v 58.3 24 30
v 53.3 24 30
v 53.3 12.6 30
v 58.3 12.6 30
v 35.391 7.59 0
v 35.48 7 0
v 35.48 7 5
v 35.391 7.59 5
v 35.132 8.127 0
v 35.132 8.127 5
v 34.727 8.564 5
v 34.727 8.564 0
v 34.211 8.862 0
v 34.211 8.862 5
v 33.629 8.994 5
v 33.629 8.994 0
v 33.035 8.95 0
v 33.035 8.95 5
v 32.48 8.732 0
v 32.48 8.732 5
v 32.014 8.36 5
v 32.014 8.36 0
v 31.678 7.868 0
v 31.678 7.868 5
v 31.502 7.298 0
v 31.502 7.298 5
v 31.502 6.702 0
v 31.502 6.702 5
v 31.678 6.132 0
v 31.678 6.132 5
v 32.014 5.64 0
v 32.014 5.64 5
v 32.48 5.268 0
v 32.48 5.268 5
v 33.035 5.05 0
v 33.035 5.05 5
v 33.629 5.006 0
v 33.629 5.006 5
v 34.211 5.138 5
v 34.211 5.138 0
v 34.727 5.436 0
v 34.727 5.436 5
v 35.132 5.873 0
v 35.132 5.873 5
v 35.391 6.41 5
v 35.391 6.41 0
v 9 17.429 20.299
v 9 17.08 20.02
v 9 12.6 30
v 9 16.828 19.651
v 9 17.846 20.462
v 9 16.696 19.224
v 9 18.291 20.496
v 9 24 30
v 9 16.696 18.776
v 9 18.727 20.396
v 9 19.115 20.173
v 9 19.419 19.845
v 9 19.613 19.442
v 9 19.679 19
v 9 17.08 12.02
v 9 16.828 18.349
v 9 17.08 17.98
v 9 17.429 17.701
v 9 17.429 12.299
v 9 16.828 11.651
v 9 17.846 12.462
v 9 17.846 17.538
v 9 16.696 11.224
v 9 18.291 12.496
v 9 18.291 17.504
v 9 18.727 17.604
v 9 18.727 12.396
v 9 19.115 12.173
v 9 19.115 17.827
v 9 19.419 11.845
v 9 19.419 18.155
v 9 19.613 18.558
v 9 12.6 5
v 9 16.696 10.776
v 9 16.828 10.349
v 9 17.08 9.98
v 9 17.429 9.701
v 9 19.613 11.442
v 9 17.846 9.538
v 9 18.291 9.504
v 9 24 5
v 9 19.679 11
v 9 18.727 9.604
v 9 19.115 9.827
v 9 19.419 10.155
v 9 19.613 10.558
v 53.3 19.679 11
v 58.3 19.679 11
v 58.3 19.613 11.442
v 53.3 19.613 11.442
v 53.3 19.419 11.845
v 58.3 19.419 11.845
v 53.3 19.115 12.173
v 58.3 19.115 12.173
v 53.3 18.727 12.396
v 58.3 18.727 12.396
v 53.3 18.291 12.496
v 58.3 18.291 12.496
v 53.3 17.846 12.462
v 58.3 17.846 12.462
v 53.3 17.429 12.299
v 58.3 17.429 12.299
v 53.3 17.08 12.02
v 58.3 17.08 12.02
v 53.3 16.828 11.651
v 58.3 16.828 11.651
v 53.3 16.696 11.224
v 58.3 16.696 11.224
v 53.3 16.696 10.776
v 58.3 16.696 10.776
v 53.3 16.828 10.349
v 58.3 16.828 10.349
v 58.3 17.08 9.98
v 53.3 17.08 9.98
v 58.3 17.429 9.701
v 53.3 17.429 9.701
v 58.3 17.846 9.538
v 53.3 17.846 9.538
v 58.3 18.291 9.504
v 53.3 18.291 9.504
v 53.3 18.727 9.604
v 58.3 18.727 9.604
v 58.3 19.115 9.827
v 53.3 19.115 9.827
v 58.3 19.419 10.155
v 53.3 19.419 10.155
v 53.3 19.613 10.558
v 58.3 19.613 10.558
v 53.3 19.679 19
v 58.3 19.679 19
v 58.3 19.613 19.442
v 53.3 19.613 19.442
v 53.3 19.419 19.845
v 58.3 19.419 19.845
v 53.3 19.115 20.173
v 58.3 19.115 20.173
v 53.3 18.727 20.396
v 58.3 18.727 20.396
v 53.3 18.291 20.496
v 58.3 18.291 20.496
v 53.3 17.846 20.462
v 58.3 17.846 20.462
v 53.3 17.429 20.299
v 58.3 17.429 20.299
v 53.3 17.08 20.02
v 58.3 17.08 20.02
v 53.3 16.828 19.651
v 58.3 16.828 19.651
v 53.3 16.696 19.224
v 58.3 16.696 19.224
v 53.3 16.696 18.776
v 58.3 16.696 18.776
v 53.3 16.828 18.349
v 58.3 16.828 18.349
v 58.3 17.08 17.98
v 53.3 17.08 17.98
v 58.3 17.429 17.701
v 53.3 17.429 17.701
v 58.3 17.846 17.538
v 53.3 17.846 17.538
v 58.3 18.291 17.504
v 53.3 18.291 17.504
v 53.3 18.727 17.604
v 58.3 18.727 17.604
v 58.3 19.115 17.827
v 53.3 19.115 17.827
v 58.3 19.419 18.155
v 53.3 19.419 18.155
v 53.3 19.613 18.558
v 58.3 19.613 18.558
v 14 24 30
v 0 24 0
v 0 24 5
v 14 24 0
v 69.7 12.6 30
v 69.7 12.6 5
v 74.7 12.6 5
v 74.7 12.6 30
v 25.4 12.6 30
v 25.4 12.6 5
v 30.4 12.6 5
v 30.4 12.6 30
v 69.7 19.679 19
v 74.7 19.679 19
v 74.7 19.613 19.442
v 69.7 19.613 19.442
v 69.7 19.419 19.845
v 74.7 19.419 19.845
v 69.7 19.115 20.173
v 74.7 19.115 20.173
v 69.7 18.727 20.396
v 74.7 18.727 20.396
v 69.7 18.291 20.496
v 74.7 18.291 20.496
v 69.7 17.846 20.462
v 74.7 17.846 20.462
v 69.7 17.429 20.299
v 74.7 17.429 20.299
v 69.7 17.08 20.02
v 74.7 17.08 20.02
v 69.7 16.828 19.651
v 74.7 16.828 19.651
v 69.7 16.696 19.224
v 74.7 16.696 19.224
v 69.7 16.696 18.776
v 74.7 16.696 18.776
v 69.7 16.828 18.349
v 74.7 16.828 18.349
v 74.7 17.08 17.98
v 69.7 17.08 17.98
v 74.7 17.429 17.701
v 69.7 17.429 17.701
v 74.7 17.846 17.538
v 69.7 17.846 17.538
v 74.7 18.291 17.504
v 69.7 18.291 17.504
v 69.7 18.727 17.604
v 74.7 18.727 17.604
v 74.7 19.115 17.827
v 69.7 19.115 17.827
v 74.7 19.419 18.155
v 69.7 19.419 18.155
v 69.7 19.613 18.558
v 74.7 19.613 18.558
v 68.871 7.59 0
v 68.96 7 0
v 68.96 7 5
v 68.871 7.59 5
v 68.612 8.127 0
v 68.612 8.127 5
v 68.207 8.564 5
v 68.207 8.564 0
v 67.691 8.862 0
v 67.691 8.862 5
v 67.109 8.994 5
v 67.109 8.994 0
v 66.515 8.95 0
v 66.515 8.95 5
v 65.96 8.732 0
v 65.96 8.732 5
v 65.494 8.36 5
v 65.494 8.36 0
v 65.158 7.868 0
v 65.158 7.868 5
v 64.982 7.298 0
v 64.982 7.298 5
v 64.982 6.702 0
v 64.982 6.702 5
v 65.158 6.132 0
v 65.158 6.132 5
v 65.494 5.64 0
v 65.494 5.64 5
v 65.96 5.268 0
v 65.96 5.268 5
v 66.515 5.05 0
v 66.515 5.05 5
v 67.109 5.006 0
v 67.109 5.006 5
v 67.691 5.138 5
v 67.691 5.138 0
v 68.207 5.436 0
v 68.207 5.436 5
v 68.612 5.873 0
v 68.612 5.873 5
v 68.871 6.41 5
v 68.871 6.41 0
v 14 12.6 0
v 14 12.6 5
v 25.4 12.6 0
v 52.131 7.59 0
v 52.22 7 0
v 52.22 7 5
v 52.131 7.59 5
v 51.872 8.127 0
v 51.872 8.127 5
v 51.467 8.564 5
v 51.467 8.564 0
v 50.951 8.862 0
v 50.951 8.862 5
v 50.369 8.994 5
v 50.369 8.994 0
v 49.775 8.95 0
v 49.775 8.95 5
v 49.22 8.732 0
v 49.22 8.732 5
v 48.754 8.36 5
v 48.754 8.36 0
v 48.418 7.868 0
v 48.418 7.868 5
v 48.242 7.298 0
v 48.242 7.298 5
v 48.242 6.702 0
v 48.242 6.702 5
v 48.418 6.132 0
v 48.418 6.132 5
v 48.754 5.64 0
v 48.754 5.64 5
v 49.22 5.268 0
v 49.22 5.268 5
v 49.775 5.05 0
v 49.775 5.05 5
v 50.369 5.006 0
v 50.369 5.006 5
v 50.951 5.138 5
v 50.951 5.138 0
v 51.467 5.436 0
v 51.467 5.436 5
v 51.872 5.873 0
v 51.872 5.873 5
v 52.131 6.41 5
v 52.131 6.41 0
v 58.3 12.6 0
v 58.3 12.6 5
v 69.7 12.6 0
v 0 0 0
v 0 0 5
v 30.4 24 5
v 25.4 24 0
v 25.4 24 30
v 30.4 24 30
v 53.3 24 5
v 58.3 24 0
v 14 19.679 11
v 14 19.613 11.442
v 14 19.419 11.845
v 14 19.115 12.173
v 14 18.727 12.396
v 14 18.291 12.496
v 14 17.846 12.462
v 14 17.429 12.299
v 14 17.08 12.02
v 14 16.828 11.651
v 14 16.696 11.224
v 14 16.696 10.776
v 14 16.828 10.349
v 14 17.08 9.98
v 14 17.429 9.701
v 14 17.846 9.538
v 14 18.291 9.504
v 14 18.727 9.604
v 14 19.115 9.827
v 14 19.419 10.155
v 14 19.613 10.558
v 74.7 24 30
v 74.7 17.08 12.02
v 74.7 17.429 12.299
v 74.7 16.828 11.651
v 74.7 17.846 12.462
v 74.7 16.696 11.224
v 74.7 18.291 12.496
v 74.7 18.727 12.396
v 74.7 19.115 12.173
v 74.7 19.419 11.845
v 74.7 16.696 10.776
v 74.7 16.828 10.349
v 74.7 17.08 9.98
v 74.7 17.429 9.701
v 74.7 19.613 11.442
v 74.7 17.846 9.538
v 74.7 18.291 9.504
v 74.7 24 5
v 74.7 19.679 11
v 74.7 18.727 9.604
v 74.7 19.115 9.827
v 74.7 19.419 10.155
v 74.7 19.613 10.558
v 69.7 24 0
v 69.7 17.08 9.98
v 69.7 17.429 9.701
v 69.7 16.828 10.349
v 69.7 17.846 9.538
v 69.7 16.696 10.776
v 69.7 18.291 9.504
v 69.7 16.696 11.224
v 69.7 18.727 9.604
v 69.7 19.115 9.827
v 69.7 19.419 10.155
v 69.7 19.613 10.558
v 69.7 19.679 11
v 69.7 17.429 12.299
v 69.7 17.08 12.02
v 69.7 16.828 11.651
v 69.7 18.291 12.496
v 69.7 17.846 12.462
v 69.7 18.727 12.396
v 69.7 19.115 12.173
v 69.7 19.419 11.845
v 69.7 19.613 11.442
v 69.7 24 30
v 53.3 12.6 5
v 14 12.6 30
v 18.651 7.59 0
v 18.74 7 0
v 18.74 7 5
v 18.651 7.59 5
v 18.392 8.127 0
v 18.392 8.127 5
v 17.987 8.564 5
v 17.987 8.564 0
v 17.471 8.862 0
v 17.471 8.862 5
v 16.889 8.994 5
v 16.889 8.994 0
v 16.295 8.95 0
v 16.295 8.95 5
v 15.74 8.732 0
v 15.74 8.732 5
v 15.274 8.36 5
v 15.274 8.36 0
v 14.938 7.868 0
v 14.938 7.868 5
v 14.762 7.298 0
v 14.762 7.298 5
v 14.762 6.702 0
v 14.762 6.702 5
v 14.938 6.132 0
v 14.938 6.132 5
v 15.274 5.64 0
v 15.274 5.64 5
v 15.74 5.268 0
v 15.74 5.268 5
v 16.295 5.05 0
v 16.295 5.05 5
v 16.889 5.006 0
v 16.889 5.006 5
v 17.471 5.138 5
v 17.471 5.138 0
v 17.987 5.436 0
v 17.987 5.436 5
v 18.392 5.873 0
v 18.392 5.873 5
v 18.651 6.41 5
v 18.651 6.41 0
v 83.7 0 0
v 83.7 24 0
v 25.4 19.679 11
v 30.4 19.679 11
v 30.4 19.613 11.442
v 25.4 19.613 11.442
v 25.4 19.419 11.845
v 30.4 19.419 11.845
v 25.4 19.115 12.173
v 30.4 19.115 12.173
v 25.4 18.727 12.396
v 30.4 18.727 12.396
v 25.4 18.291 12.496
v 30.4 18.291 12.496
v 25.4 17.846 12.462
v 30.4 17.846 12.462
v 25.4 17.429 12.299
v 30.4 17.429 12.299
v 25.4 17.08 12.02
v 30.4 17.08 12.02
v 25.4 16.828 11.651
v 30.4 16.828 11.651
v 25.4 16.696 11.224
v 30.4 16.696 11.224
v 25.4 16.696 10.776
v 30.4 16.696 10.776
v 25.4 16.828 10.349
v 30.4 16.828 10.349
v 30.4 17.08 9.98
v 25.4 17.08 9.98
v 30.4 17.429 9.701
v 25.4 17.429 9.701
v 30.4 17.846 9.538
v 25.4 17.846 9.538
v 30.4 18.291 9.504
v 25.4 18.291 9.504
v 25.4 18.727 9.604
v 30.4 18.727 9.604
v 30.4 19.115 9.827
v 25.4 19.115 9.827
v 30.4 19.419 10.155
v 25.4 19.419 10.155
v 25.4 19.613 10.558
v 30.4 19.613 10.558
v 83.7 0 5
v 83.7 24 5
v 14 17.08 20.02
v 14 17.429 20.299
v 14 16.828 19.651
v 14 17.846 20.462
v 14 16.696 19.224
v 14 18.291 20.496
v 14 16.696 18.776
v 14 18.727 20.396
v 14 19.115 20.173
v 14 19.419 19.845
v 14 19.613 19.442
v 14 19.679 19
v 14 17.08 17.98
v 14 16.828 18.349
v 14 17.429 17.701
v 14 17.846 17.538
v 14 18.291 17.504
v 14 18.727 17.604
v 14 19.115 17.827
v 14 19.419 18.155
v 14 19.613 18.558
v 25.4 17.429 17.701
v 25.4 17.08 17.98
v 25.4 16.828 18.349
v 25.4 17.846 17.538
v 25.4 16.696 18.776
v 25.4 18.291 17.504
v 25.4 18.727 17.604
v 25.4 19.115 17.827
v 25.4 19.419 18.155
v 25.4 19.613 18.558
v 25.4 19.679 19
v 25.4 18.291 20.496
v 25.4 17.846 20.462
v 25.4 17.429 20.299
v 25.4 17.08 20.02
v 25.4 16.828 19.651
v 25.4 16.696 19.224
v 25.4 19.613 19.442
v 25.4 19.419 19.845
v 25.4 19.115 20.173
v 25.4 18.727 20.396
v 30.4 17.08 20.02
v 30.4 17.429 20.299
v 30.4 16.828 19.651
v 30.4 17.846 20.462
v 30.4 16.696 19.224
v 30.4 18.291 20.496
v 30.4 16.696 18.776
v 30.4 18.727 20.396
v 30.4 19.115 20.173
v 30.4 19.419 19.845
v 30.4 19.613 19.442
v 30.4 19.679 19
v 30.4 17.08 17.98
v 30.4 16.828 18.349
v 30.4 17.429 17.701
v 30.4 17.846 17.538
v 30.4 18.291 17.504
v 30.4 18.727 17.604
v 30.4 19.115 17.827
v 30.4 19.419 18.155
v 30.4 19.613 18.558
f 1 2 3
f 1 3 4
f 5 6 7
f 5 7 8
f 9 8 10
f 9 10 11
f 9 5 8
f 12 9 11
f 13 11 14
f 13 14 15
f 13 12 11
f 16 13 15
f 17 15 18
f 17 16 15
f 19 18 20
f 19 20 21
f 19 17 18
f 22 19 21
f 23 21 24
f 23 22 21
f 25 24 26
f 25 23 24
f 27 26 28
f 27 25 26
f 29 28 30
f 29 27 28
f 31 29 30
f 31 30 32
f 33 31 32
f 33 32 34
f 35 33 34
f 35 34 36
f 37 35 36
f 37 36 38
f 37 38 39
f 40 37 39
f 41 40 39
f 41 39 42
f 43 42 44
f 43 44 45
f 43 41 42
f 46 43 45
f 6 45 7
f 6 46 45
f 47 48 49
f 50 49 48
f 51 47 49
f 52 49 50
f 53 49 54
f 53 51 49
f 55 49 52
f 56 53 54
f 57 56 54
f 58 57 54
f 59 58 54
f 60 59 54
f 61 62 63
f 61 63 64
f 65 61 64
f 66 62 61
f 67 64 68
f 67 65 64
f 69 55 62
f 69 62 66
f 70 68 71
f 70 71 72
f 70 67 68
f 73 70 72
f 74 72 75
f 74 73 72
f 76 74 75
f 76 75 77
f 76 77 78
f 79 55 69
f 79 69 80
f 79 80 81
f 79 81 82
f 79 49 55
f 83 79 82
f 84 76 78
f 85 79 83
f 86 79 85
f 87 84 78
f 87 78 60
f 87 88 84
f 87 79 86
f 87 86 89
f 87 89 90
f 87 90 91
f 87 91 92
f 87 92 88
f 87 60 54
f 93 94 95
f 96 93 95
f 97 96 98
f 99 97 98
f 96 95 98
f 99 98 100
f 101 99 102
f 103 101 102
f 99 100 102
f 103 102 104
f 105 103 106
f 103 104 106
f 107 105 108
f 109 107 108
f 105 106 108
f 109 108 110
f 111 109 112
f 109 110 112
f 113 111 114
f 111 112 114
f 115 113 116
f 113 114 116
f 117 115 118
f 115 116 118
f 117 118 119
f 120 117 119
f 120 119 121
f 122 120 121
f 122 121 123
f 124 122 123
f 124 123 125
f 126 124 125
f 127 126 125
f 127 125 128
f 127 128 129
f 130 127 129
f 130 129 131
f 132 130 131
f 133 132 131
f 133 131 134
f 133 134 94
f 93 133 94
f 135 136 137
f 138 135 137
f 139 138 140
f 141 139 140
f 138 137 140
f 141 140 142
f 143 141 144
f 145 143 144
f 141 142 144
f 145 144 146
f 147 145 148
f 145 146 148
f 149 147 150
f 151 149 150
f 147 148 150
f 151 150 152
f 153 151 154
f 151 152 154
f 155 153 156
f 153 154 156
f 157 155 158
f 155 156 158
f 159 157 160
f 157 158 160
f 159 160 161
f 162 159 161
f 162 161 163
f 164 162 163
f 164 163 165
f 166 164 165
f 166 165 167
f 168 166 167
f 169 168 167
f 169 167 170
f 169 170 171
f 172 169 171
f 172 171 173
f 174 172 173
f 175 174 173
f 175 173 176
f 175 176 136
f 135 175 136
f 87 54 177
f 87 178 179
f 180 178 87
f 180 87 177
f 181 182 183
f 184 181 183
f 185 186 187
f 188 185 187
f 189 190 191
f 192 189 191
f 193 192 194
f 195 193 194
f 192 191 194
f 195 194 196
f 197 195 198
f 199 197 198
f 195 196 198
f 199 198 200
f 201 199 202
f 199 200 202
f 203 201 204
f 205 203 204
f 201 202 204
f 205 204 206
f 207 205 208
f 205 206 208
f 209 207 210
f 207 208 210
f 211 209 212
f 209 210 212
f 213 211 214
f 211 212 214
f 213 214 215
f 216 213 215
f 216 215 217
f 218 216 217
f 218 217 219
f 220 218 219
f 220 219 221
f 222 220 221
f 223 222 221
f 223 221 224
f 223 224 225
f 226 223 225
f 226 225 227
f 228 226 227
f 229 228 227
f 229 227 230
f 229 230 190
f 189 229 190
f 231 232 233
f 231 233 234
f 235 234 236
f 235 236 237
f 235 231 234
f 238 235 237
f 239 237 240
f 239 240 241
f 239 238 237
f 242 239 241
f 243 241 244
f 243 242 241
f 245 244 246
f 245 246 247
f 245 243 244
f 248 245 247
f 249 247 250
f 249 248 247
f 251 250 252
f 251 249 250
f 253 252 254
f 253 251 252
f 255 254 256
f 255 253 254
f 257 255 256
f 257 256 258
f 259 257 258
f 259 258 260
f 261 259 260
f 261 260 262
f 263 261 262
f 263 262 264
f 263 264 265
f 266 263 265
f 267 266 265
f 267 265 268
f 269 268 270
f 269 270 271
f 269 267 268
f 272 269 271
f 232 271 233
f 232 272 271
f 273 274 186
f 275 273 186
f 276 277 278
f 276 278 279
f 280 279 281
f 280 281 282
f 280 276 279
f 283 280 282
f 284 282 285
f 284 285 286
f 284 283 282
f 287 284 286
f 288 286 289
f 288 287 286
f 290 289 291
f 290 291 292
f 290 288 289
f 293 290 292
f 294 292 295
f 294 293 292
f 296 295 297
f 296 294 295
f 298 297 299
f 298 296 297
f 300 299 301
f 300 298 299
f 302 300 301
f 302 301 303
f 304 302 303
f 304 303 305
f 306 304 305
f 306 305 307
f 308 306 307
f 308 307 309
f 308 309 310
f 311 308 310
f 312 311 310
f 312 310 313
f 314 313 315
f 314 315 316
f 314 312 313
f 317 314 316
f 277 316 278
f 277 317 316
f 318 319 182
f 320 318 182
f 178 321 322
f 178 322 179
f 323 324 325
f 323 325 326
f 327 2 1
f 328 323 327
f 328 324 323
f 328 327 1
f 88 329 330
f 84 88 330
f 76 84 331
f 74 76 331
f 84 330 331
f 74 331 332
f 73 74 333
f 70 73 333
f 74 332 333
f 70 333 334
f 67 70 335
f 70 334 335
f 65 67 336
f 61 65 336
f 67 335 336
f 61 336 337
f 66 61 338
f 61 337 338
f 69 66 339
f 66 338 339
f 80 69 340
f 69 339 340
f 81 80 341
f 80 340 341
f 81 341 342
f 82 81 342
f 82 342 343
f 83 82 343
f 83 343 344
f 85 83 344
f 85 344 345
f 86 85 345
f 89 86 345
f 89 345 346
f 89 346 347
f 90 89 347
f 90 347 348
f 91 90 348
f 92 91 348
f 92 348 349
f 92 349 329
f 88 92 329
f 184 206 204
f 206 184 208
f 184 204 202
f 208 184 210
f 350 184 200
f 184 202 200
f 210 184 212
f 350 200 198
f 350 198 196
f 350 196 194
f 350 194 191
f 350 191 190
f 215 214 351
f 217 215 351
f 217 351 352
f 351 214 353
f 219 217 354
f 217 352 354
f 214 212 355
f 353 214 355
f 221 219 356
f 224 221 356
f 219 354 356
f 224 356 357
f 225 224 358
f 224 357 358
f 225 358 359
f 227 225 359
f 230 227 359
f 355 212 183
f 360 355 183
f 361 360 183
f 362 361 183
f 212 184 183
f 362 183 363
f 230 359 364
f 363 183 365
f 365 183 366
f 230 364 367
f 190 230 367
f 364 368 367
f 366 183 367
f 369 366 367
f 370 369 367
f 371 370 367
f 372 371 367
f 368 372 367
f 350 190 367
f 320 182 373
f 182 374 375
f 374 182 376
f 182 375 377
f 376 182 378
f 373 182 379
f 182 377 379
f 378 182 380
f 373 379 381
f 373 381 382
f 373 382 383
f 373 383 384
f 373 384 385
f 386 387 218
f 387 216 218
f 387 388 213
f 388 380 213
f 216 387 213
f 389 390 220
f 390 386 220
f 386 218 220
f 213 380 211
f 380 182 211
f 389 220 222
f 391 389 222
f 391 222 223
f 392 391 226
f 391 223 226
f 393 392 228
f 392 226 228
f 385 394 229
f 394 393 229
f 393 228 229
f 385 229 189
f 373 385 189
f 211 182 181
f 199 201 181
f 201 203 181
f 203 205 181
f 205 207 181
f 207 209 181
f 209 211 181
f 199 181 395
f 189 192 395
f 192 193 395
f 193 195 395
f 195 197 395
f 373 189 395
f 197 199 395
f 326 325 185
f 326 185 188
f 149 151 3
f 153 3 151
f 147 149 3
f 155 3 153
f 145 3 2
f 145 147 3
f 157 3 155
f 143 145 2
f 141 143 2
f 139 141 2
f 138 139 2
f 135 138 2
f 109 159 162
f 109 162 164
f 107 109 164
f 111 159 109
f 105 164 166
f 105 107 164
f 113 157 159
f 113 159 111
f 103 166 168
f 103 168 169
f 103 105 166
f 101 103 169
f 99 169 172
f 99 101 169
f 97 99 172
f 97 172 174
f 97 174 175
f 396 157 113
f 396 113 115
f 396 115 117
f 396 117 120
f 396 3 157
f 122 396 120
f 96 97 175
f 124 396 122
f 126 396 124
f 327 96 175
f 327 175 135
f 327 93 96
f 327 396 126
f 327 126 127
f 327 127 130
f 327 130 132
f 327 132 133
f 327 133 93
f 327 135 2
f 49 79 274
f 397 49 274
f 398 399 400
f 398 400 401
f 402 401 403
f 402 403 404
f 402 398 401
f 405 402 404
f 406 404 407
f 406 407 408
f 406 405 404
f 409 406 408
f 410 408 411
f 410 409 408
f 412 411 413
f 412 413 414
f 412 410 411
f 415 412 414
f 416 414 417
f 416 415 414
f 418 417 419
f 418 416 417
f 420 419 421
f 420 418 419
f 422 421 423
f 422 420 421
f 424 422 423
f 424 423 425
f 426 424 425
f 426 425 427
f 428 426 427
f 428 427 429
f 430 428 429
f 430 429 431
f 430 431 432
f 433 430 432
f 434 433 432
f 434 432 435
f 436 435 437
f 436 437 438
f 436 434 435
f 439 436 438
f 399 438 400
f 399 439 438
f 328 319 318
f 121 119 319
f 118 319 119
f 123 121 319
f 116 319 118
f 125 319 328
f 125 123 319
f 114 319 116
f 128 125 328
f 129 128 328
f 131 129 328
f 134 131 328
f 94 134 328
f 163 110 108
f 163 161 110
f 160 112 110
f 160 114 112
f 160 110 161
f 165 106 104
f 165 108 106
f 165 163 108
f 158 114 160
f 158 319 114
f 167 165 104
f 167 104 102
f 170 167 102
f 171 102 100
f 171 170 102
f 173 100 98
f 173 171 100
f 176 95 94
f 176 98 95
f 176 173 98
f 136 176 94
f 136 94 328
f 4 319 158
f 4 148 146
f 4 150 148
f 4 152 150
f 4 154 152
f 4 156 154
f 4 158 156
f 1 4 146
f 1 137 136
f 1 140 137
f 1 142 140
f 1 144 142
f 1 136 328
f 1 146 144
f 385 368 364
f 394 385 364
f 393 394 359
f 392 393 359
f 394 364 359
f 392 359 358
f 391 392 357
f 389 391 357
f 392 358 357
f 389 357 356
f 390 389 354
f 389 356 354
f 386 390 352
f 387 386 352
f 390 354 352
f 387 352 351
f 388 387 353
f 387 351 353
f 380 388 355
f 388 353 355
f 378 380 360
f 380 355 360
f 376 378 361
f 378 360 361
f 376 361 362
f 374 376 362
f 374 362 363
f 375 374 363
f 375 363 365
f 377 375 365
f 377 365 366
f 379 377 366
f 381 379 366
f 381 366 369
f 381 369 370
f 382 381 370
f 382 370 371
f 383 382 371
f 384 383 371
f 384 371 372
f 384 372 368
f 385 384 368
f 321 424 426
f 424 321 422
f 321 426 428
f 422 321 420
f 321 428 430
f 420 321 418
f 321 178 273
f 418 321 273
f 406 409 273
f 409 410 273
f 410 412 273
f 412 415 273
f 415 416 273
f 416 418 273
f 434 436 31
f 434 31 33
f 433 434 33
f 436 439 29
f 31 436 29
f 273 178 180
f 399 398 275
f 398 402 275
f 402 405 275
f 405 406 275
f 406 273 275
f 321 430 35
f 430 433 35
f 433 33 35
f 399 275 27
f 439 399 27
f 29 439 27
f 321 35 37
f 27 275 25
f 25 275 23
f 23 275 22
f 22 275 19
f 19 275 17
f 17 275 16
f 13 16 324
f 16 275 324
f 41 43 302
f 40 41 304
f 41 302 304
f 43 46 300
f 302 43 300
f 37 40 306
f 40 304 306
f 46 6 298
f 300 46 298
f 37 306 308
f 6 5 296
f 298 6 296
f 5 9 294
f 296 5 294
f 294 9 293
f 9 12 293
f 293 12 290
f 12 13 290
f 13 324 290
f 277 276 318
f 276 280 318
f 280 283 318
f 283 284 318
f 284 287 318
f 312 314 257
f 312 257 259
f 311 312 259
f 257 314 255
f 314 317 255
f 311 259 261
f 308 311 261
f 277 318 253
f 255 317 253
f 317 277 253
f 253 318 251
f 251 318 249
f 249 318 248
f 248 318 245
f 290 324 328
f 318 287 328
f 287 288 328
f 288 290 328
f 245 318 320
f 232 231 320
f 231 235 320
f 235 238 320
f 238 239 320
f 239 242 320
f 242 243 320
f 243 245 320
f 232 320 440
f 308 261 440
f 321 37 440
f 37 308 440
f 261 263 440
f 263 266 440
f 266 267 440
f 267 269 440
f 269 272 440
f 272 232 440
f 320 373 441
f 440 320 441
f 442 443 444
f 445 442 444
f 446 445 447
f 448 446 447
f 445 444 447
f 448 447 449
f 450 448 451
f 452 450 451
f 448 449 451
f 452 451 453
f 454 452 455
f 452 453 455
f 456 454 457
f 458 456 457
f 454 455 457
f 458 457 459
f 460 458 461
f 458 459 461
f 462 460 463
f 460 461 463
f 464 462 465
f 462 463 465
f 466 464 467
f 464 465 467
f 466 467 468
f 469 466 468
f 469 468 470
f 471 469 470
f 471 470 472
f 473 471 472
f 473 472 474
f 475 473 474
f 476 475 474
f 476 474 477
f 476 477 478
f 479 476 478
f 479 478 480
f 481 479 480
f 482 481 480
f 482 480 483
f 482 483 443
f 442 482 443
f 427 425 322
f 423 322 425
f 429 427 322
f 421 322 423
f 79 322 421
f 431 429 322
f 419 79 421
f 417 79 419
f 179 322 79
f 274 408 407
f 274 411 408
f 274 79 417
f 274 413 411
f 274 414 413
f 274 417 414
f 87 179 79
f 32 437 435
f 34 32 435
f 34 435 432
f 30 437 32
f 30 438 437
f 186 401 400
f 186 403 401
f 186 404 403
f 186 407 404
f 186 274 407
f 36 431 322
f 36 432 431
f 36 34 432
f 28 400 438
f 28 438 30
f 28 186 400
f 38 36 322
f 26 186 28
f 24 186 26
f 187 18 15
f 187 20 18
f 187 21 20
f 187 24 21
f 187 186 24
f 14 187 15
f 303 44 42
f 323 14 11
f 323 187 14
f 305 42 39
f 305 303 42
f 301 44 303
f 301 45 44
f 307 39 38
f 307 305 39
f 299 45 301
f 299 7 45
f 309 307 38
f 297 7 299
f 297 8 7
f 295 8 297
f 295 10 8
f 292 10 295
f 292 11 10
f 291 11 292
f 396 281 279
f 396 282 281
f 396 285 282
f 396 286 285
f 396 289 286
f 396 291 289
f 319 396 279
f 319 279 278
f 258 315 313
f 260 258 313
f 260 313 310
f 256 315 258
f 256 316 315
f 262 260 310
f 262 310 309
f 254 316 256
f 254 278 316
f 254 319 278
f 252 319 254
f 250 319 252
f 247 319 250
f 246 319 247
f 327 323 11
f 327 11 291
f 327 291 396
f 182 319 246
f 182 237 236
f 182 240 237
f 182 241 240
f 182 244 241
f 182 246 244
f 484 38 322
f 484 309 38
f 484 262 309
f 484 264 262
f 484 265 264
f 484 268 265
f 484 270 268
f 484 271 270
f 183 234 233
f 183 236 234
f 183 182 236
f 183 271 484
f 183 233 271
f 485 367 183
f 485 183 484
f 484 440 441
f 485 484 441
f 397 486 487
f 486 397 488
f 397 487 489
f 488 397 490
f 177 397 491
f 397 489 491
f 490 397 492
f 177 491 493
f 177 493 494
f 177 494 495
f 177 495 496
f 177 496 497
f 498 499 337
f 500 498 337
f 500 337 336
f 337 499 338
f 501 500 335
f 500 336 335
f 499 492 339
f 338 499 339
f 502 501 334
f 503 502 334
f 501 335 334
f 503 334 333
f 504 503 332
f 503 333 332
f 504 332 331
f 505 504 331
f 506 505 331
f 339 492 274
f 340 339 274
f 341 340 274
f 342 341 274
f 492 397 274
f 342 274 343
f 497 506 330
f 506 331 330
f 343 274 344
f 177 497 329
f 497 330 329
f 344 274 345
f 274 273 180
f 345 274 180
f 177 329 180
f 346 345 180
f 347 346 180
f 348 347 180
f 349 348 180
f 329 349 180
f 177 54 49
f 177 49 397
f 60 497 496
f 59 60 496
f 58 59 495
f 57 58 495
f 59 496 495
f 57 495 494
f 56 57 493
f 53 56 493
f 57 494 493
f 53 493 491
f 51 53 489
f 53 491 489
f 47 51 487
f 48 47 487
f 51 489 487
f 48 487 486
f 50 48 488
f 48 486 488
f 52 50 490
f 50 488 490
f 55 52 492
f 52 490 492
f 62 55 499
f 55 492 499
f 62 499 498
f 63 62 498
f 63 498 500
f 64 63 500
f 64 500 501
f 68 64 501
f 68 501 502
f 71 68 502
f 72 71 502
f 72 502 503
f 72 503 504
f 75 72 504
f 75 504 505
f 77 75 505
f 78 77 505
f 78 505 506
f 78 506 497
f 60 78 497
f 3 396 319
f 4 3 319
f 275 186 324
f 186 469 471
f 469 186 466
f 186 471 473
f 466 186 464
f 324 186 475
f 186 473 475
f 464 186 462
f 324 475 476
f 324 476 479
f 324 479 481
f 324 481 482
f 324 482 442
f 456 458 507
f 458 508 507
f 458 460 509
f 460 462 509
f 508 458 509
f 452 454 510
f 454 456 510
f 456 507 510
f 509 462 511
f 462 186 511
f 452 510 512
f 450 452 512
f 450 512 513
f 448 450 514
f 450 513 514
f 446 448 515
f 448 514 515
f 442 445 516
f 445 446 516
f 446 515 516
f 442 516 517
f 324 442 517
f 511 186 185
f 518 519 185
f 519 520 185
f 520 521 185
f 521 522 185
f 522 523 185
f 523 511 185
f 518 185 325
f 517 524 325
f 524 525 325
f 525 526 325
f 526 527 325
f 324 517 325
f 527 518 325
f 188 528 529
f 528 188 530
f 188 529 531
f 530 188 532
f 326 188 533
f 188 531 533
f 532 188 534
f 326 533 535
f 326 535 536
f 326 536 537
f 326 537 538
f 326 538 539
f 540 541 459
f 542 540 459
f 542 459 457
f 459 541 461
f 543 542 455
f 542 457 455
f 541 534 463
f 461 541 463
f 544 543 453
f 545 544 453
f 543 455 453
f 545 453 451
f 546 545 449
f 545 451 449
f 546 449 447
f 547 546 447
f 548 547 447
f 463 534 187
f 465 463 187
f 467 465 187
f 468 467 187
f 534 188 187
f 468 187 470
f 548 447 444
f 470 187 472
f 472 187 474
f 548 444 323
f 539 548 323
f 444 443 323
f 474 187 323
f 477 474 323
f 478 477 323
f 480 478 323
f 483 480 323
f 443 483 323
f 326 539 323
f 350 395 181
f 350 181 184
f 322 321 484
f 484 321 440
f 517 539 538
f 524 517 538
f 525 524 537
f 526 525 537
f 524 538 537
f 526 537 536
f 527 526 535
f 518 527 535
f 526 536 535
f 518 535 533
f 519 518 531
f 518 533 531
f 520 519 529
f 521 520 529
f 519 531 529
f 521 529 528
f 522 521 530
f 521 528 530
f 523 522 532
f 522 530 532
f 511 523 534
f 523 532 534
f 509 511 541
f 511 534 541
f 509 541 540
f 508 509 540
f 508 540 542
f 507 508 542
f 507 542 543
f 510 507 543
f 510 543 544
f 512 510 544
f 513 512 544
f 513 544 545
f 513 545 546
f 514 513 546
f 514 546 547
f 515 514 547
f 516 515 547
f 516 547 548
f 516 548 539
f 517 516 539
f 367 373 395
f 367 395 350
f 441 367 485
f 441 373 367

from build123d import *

# Parameters (mm, degrees)
SKETCH_W        = 83.7
SKETCH_H        = 24
SKETCH_R        = 2
PAD_DEPTH       = 5
SKETCH001_W     = 11.4
SKETCH001_H     = 11.4
POCKET_DEPTH    = 5.001
SKETCH002_W     = 5
SKETCH002_H     = 11.4
PAD001_DEPTH    = 25
SKETCH003_R     = 1.5
POCKET001_DEPTH = 74.701


with BuildPart() as part:
    # Sketch → Pad (new body)
    with BuildSketch(Plane.XY):
        with Locations((41.85, 12)):
            Rectangle(SKETCH_W, SKETCH_H)
        with Locations((33.48, 7)):
            Circle(SKETCH_R, mode=Mode.SUBTRACT)
        with Locations((16.74, 7)):
            Circle(SKETCH_R, mode=Mode.SUBTRACT)
        with Locations((50.22, 7)):
            Circle(SKETCH_R, mode=Mode.SUBTRACT)
        with Locations((66.96, 7)):
            Circle(SKETCH_R, mode=Mode.SUBTRACT)
    extrude(amount=PAD_DEPTH)

    # Sketch001 → Pocket (cut, through all)
    with BuildSketch(Plane.XY.offset(5)):
        with Locations((64, 18.3)):
            Rectangle(SKETCH001_W, SKETCH001_H)
        with Locations((19.7, 18.3)):
            Rectangle(SKETCH001_W, SKETCH001_H)
    extrude(amount=-POCKET_DEPTH, mode=Mode.SUBTRACT)

    # Sketch002 → Pad001 (new body)
    with BuildSketch(Plane.XY.offset(5)):
        with Locations((11.5, 18.3)):
            Rectangle(SKETCH002_W, SKETCH002_H)
        with Locations((27.9, 18.3)):
            Rectangle(SKETCH002_W, SKETCH002_H)
        with Locations((55.8, 18.3)):
            Rectangle(SKETCH002_W, SKETCH002_H)
        with Locations((72.2, 18.3)):
            Rectangle(SKETCH002_W, SKETCH002_H)
    extrude(amount=PAD001_DEPTH)

    # Sketch003 → Pocket001 (cut, through all)
    with BuildSketch(Plane.YZ.offset(74.7)):
        with Locations((18.179388, 19)):
            Circle(SKETCH003_R)
        with Locations((18.179388, 11)):
            Circle(SKETCH003_R)
    extrude(amount=-POCKET001_DEPTH, mode=Mode.SUBTRACT)


solid = part.part
